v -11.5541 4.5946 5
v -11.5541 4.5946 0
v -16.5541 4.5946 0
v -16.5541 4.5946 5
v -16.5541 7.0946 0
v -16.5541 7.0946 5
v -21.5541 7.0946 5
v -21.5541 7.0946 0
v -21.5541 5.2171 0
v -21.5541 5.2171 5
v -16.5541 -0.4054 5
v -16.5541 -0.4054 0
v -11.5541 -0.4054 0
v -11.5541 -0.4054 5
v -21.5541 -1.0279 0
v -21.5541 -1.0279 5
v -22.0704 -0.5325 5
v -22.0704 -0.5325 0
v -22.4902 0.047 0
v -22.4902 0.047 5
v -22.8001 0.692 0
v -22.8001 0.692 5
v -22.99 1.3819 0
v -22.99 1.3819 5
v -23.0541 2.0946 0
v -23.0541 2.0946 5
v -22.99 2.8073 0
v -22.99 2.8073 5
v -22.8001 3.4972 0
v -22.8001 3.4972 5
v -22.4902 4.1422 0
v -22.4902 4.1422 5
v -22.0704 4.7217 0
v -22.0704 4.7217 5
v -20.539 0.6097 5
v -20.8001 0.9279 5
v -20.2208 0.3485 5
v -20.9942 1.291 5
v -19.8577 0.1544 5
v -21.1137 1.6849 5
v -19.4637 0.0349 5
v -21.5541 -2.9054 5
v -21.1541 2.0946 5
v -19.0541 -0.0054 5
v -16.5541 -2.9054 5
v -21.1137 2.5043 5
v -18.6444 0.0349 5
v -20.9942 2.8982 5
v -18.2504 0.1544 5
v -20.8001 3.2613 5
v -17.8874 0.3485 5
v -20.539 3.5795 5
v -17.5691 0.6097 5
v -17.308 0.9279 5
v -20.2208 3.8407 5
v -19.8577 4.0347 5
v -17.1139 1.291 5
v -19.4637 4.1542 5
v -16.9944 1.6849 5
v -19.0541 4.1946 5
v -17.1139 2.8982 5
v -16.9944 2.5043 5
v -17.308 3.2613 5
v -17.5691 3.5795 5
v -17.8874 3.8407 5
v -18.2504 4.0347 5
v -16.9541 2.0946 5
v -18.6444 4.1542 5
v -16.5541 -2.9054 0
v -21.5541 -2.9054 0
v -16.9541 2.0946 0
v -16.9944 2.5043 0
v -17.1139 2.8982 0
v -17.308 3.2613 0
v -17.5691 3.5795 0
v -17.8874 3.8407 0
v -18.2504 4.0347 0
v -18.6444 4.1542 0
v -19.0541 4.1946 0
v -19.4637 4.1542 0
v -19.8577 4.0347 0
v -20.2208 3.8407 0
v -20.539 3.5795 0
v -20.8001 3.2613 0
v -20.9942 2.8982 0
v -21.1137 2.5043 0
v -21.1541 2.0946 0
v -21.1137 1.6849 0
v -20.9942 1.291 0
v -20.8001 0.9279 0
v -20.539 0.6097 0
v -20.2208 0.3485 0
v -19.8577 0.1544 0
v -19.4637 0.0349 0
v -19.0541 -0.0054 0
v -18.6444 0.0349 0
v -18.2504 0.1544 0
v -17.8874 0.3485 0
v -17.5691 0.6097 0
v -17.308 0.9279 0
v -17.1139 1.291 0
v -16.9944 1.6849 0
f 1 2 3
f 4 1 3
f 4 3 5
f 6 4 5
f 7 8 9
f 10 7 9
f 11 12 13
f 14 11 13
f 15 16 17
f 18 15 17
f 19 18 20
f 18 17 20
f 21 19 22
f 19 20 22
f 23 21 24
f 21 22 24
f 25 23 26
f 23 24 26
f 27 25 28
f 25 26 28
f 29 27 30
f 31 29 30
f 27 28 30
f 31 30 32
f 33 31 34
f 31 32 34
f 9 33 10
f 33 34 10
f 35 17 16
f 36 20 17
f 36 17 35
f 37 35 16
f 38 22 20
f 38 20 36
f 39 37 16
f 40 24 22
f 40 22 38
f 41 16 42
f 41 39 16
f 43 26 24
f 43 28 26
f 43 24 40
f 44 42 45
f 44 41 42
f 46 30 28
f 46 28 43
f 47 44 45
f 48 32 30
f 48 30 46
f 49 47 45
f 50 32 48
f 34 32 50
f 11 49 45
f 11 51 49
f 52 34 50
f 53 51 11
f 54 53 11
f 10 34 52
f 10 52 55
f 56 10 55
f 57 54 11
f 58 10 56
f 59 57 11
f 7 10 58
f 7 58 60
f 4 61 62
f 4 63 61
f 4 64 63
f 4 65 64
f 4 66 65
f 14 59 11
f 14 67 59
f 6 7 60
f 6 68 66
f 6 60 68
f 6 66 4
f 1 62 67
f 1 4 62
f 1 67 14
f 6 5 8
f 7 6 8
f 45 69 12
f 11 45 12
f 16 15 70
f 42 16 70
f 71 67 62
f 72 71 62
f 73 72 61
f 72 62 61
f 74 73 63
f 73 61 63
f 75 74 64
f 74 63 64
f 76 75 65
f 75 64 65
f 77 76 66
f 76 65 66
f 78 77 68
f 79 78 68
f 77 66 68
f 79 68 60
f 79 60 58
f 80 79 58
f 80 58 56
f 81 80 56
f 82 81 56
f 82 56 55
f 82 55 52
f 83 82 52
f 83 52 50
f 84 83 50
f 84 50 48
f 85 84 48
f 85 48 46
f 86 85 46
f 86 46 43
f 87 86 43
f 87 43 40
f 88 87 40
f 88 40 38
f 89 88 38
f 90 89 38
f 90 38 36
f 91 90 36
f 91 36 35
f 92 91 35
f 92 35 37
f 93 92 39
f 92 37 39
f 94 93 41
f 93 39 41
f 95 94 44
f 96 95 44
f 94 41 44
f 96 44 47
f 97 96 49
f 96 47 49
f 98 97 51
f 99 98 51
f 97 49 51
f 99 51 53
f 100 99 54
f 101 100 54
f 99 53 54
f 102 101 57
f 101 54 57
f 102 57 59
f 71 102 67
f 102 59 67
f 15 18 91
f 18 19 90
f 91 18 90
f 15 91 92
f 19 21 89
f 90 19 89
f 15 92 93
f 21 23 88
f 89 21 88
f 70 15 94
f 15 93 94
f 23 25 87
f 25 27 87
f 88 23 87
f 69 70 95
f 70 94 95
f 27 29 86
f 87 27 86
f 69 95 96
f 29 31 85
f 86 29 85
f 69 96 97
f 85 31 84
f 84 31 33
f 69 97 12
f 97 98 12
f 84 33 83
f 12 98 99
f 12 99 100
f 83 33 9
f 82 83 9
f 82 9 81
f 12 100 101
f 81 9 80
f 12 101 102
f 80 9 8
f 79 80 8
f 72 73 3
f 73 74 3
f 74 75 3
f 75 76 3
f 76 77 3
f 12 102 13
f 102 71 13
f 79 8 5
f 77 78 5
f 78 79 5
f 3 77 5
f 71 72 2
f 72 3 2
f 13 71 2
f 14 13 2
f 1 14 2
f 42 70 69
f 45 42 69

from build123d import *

# Parameters (mm, degrees)
BOSS_EXTRUDE1_DEPTH = 5
SKETCH2_R           = 2.1
CUT_EXTRUDE1_DEPTH  = 10
BOSS_EXTRUDE2_DEPTH = 5


with BuildPart() as part:
    # Sketch1 → Boss-Extrude1 (new body)
    with BuildSketch(Plane.XY):
        Polygon((-16.554054054, 7.094594595), (-21.554054054, 7.094594595), (-21.554054054, -2.905405405), (-16.554054054, -2.905405405), (-16.554054054, -0.405405405), (-11.554054054, -0.405405405), (-11.554054054, 4.594594595), (-16.554054054, 4.594594595), align=None)
    extrude(amount=BOSS_EXTRUDE1_DEPTH)

    # Sketch2 → Cut-Extrude1 (cut)
    with BuildSketch(Plane.XY.offset(5)):
        with Locations((-19.054054054, 2.094594595)):
            Circle(SKETCH2_R)
    extrude(amount=-CUT_EXTRUDE1_DEPTH, mode=Mode.SUBTRACT)

    # Sketch3 → Boss-Extrude2 (add)
    with BuildSketch(Plane.XY.offset(5)):
        with BuildLine():
            Line((-21.554054054, 5.217093594), (-21.554054054, -1.027904405))
            ThreePointArc((-21.554054054, -1.027904405), (-23.054054054, 2.094594595), (-21.554054054, 5.217093594))
        make_face()
    extrude(amount=-BOSS_EXTRUDE2_DEPTH)


solid = part.part
